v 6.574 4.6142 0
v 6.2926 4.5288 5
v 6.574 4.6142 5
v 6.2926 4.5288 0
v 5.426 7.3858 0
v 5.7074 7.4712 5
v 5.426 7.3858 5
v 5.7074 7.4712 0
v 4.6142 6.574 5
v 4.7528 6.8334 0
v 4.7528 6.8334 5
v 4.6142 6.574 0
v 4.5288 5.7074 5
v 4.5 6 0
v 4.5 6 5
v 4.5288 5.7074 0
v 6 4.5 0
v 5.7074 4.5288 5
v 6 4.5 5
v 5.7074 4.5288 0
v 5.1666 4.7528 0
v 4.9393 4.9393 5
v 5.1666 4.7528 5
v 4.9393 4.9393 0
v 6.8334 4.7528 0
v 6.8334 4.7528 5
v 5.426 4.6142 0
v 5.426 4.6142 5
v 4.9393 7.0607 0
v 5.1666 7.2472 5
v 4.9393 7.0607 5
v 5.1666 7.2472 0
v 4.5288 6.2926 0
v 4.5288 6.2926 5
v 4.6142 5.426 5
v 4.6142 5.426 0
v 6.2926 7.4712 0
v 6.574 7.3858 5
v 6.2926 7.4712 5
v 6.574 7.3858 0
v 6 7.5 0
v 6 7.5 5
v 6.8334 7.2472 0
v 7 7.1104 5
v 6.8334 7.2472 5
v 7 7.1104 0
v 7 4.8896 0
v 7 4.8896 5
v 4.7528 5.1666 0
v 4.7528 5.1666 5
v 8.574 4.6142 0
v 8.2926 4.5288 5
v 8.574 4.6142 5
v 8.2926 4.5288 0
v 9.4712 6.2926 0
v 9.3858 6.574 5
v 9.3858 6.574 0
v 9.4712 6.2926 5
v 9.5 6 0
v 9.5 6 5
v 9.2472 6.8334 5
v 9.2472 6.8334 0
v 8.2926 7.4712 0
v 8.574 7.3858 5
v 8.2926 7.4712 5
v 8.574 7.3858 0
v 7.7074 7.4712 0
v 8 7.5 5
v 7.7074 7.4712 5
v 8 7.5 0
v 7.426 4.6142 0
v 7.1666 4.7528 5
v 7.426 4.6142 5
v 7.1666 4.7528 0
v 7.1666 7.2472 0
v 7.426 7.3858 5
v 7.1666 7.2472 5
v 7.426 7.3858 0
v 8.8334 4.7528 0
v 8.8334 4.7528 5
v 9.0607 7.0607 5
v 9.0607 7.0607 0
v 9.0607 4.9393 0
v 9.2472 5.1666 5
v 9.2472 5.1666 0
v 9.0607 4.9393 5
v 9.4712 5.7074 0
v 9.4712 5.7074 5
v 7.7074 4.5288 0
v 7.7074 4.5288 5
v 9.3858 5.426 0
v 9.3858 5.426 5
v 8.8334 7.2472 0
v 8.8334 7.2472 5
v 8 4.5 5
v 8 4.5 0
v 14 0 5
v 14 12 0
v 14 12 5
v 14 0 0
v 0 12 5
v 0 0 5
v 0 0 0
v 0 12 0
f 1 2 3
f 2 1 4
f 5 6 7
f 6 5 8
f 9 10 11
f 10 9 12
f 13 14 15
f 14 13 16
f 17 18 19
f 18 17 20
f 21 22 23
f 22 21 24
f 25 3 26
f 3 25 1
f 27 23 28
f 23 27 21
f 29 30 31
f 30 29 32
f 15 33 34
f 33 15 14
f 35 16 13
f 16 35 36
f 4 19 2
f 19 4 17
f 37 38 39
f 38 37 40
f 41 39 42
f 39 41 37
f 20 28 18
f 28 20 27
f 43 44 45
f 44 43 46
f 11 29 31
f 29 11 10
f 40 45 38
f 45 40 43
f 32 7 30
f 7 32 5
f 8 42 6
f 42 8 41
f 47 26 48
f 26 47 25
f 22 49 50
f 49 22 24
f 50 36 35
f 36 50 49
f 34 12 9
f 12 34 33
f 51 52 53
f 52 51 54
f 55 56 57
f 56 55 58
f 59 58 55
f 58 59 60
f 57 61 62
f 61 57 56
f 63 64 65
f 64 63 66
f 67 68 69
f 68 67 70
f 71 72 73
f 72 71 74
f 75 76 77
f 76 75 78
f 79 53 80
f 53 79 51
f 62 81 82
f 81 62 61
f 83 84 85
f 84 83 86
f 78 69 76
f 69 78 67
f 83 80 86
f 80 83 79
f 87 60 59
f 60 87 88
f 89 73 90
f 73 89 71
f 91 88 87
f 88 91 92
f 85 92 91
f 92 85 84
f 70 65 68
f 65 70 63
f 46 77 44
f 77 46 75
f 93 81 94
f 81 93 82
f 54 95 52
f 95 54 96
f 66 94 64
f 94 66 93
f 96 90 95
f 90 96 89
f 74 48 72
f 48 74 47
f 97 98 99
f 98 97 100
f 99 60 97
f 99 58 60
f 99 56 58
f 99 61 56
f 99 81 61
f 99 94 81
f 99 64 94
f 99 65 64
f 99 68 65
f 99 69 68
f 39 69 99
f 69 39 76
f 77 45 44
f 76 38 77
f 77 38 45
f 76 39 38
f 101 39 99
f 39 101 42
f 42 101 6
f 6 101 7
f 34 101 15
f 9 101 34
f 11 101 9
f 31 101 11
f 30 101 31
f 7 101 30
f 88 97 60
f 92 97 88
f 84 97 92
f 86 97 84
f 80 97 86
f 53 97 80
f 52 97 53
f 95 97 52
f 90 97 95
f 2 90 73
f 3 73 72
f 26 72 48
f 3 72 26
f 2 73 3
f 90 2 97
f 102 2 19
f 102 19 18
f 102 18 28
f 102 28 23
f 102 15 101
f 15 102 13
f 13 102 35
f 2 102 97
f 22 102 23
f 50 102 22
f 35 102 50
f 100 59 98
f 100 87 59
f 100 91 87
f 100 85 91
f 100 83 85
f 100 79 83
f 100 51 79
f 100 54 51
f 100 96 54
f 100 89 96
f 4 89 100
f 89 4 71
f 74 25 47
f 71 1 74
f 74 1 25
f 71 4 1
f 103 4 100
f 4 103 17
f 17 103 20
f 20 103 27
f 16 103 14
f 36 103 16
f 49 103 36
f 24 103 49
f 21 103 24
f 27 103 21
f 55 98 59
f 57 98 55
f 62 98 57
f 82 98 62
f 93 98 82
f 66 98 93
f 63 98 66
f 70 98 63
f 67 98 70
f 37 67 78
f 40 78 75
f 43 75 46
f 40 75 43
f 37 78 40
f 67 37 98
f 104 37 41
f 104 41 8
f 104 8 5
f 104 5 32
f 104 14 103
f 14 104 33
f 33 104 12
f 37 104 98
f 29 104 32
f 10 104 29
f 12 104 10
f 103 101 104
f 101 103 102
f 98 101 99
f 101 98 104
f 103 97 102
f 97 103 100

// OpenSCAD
$fn = 32;

// ----------------------------------------------------------------------
// Micro pad: two-hole pad, 5-20 mm class
// ----------------------------------------------------------------------

// --- parameters (mm) ---
pad_l = 14;               // pad length, X
pad_w = 12;               // pad width, Y
pad_t = 5;                // pad thickness, Z
hole_d = 3;               // hole diameter
hole_x = 6;               // X of the first hole centre

difference() {
  cube([pad_l, pad_w, pad_t]);
  for (x = [hole_x, pad_l - hole_x])
    translate([x, pad_w / 2, -1])
      cylinder(h = pad_t + 2, d = hole_d);
}
